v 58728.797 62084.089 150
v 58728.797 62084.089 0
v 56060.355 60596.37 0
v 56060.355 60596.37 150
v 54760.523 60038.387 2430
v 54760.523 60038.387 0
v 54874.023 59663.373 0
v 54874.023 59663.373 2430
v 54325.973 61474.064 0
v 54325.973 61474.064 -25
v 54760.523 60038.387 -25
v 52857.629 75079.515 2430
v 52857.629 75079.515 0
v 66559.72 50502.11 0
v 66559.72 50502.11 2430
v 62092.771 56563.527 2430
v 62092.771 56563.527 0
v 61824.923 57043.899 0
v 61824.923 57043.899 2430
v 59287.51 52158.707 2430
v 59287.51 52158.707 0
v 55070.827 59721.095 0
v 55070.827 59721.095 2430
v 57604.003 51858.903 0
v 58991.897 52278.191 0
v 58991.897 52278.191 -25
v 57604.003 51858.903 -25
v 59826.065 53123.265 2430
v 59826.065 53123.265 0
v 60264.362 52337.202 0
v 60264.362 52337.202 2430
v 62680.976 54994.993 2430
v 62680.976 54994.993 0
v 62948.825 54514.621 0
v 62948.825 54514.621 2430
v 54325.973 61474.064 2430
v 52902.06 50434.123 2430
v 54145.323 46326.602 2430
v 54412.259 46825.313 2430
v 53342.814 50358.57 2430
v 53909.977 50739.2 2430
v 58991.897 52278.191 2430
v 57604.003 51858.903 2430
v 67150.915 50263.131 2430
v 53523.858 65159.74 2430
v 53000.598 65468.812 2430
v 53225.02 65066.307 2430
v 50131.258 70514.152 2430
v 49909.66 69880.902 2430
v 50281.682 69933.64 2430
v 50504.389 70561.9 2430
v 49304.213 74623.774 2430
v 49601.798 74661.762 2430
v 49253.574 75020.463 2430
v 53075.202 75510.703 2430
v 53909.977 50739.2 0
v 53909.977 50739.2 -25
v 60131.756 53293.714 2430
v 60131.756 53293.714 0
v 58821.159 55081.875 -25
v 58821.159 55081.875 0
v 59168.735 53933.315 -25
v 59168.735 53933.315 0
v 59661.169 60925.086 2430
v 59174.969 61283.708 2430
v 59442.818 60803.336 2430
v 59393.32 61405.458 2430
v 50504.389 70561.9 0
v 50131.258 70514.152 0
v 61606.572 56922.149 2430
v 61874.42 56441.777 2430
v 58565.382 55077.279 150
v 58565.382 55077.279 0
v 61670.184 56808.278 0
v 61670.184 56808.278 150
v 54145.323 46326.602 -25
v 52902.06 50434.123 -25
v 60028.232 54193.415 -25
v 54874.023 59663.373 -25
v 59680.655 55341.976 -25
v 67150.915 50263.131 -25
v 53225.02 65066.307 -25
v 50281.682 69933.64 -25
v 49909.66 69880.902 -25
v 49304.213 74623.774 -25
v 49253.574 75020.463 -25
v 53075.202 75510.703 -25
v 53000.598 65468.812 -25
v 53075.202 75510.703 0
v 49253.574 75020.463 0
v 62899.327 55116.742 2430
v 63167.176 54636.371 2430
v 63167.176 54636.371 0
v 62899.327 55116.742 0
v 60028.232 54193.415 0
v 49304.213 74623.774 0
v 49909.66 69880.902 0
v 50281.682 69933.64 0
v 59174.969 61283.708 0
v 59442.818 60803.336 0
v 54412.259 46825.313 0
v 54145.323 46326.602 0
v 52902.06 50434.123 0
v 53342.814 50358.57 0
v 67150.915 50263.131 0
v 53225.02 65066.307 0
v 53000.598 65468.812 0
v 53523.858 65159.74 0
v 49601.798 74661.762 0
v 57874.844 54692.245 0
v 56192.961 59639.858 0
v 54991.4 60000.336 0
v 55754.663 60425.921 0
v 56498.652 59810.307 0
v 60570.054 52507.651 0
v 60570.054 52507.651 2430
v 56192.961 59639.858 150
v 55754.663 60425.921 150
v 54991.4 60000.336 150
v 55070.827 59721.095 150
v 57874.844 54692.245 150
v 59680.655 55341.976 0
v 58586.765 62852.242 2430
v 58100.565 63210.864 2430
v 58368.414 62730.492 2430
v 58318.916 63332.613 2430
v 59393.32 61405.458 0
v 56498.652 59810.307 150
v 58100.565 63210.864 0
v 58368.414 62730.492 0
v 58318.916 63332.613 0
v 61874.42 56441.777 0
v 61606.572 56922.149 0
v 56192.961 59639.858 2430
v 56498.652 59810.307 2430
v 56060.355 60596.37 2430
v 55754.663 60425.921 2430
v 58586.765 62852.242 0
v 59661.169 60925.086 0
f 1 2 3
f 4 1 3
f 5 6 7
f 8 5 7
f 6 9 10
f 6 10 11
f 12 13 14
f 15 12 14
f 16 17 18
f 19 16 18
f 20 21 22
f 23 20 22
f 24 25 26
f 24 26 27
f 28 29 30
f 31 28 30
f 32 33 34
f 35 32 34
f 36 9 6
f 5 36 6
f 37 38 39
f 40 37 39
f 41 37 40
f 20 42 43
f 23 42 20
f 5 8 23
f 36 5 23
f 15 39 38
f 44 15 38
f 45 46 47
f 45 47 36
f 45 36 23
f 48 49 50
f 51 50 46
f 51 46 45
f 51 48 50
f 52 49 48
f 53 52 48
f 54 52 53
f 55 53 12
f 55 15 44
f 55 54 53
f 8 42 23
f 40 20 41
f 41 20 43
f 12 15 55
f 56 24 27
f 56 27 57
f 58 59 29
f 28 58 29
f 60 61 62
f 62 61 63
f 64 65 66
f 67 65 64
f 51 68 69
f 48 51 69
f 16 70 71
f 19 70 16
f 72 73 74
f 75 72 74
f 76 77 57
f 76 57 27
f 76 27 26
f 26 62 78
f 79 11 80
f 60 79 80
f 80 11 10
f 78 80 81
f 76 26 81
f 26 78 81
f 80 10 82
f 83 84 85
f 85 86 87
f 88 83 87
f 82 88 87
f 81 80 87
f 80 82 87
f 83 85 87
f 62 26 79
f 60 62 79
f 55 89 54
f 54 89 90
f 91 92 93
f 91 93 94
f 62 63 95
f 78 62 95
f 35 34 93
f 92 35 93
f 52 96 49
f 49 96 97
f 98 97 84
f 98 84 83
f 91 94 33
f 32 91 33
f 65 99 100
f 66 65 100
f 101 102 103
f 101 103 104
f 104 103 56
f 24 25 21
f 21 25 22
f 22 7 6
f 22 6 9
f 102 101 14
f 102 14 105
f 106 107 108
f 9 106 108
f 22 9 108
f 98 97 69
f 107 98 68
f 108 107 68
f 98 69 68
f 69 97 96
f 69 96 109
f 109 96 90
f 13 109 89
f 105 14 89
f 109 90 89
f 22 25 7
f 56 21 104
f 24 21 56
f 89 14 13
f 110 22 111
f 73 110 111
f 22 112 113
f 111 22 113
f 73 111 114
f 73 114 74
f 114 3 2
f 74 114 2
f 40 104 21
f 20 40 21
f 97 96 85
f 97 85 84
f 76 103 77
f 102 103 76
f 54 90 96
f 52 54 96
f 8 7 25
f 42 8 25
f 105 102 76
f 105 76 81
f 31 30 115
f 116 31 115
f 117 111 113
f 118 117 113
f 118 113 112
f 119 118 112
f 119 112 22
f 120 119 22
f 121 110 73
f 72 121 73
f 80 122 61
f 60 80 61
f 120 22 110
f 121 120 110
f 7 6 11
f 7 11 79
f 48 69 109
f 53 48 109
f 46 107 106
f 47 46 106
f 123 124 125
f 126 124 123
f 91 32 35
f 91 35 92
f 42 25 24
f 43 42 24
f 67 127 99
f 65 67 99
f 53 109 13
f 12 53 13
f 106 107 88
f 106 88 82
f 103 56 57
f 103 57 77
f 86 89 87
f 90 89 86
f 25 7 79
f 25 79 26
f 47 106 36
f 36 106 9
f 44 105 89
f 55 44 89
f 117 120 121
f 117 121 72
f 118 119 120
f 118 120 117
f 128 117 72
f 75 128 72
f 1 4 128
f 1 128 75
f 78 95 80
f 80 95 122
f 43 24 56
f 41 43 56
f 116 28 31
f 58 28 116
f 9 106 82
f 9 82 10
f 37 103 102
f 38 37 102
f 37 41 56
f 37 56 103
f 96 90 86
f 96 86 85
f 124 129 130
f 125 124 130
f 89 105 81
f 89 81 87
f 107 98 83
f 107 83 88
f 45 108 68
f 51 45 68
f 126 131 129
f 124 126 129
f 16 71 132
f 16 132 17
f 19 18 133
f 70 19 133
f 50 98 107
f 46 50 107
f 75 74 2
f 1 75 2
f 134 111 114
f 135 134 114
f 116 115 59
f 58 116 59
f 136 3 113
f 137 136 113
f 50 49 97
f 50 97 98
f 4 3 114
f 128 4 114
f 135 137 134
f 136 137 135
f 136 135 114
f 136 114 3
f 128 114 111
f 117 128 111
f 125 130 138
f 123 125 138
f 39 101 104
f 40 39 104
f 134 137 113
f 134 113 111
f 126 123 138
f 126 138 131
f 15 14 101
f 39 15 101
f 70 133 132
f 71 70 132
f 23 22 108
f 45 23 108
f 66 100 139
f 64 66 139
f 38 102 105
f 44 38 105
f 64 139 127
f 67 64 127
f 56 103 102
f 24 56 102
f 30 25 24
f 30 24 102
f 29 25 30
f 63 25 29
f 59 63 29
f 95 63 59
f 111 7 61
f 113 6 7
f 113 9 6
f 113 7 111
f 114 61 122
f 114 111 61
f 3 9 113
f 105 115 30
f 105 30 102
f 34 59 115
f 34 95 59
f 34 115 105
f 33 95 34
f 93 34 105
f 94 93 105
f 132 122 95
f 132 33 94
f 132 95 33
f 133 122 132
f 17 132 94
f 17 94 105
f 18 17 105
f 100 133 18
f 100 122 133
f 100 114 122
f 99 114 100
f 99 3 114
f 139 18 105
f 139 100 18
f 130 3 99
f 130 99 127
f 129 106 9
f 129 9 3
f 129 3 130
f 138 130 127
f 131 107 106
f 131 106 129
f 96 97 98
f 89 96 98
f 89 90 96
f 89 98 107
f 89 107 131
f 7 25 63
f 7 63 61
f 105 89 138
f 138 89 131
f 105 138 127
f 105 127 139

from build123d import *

# Parameters (mm, degrees)
F3_DEPTH  = 2430
F5_DEPTH  = 25
F7_DEPTH  = 2430
F9_DEPTH  = 150
F11_DEPTH = 25.001


# Not quite as in the source:
# - ends of sketch curves that miss each other by under 0.0002 mm in the source are joined


with BuildPart() as f3:
    # F2 (on Top) → F3 (new body)
    with BuildSketch(Plane.XY):
        Polygon((52902.0595629306, 50434.1230428591), (54145.32292, 46326.602018), (54431.4219269024, 46413.1983883223), (67150.915474, 50263.131268), (53075.201891, 75510.702684), (49253.5741891713, 75020.4629237414), (49304.213105, 74623.774346), (49909.660074, 69880.902321), (50281.682258, 69933.639978), (53000.597675, 65468.812402), (53225.019852, 65066.306629), (54325.972768, 61474.063518), (54760.522861, 60038.387295), (54874.022799, 59663.37285), (58991.897227, 52278.191447), (57604.002801, 51858.903346), (53909.97748, 50739.1999), align=None)
        Polygon((54412.25928, 46825.31334), (53342.81403, 50358.57026), (59287.509616, 52158.706562), (55070.827017, 59721.094989), (53523.858293, 65159.740021), (50504.389213421, 70561.8996273451), (50131.257661, 70514.151722), (49601.798244, 74661.762303), (52857.629236, 75079.514646), (66559.719817, 50502.109853), align=None, mode=Mode.SUBTRACT)
    extrude(amount=F3_DEPTH)


with BuildPart() as f5:
    # F4 (on Top) → F5 (new body)
    with BuildSketch(Plane.XY):
        Polygon((54760.522861, 60038.387295), (54874.022799, 59663.37285), (58991.897227, 52278.191447), (57604.002801, 51858.903346), (53909.97748, 50739.1999), (52902.0595629306, 50434.1230428591), (54145.32292, 46326.602018), (67150.915474, 50263.131268), (53075.201891, 75510.702684), (49253.5741891713, 75020.4629237414), (49304.213105, 74623.774346), (49909.660074, 69880.902321), (50281.682258, 69933.639978), (53000.597675, 65468.812402), (53225.019852, 65066.306629), (54325.972768, 61474.063518), align=None)
    extrude(amount=-F5_DEPTH)

    # F6 (on Top) → F7 (join)
    with BuildSketch(Plane.XY):
        Polygon((63167.175561, 54636.370609), (62899.326908, 55116.742443), (62680.976074, 54994.993056), (62948.824727, 54514.621222), align=None)
        Polygon((61606.57177, 56922.149305), (61874.420423, 56441.777471), (62092.771256, 56563.526859), (61824.922604, 57043.898693), align=None)
        Polygon((60131.75578, 53293.714353), (59826.064613, 53123.26521), (60264.362406, 52337.202212), (60570.053573, 52507.651355), align=None)
        Polygon((56498.652366, 59810.307311), (56060.354571, 60596.370312), (55754.663404, 60425.921169), (56192.961199, 59639.858168), align=None)
        Polygon((59393.320264, 61405.457583), (59174.969431, 61283.708196), (59442.818085, 60803.336359), (59661.168918, 60925.085747), align=None)
        Polygon((58586.764842, 62852.241589), (58318.916189, 63332.613423), (58100.565355, 63210.864035), (58368.414008, 62730.492201), align=None)
    extrude(amount=F7_DEPTH)

    # F10 (on face) → F11 (cut, through all)
    with BuildSketch(Plane.XY):
        Polygon((59168.735458, 53933.31513), (60028.231633, 54193.415485), (59680.654869, 55341.975624), (58821.158694, 55081.875269), align=None)
    extrude(amount=-F11_DEPTH, mode=Mode.SUBTRACT)


with BuildPart() as f9:
    # F8 (on Top) → F9 (new body)
    with BuildSketch(Plane.XY):
        Polygon((58728.797232615, 62084.088870835), (56060.354571, 60596.370312), (56498.652366, 59810.307311), (56192.961199, 59639.858168), (55754.663404, 60425.921169), (54991.3996931603, 60000.3359416475), (55070.827017, 59721.094989), (55102.8168784927, 59663.7229310719), (57874.844064254, 54692.2445670372), (58565.3824039826, 55077.2791403316), (61670.1839855803, 56808.2778988538), align=None)
    extrude(amount=F9_DEPTH)


solid = Compound([f3.part, f5.part, f9.part])
